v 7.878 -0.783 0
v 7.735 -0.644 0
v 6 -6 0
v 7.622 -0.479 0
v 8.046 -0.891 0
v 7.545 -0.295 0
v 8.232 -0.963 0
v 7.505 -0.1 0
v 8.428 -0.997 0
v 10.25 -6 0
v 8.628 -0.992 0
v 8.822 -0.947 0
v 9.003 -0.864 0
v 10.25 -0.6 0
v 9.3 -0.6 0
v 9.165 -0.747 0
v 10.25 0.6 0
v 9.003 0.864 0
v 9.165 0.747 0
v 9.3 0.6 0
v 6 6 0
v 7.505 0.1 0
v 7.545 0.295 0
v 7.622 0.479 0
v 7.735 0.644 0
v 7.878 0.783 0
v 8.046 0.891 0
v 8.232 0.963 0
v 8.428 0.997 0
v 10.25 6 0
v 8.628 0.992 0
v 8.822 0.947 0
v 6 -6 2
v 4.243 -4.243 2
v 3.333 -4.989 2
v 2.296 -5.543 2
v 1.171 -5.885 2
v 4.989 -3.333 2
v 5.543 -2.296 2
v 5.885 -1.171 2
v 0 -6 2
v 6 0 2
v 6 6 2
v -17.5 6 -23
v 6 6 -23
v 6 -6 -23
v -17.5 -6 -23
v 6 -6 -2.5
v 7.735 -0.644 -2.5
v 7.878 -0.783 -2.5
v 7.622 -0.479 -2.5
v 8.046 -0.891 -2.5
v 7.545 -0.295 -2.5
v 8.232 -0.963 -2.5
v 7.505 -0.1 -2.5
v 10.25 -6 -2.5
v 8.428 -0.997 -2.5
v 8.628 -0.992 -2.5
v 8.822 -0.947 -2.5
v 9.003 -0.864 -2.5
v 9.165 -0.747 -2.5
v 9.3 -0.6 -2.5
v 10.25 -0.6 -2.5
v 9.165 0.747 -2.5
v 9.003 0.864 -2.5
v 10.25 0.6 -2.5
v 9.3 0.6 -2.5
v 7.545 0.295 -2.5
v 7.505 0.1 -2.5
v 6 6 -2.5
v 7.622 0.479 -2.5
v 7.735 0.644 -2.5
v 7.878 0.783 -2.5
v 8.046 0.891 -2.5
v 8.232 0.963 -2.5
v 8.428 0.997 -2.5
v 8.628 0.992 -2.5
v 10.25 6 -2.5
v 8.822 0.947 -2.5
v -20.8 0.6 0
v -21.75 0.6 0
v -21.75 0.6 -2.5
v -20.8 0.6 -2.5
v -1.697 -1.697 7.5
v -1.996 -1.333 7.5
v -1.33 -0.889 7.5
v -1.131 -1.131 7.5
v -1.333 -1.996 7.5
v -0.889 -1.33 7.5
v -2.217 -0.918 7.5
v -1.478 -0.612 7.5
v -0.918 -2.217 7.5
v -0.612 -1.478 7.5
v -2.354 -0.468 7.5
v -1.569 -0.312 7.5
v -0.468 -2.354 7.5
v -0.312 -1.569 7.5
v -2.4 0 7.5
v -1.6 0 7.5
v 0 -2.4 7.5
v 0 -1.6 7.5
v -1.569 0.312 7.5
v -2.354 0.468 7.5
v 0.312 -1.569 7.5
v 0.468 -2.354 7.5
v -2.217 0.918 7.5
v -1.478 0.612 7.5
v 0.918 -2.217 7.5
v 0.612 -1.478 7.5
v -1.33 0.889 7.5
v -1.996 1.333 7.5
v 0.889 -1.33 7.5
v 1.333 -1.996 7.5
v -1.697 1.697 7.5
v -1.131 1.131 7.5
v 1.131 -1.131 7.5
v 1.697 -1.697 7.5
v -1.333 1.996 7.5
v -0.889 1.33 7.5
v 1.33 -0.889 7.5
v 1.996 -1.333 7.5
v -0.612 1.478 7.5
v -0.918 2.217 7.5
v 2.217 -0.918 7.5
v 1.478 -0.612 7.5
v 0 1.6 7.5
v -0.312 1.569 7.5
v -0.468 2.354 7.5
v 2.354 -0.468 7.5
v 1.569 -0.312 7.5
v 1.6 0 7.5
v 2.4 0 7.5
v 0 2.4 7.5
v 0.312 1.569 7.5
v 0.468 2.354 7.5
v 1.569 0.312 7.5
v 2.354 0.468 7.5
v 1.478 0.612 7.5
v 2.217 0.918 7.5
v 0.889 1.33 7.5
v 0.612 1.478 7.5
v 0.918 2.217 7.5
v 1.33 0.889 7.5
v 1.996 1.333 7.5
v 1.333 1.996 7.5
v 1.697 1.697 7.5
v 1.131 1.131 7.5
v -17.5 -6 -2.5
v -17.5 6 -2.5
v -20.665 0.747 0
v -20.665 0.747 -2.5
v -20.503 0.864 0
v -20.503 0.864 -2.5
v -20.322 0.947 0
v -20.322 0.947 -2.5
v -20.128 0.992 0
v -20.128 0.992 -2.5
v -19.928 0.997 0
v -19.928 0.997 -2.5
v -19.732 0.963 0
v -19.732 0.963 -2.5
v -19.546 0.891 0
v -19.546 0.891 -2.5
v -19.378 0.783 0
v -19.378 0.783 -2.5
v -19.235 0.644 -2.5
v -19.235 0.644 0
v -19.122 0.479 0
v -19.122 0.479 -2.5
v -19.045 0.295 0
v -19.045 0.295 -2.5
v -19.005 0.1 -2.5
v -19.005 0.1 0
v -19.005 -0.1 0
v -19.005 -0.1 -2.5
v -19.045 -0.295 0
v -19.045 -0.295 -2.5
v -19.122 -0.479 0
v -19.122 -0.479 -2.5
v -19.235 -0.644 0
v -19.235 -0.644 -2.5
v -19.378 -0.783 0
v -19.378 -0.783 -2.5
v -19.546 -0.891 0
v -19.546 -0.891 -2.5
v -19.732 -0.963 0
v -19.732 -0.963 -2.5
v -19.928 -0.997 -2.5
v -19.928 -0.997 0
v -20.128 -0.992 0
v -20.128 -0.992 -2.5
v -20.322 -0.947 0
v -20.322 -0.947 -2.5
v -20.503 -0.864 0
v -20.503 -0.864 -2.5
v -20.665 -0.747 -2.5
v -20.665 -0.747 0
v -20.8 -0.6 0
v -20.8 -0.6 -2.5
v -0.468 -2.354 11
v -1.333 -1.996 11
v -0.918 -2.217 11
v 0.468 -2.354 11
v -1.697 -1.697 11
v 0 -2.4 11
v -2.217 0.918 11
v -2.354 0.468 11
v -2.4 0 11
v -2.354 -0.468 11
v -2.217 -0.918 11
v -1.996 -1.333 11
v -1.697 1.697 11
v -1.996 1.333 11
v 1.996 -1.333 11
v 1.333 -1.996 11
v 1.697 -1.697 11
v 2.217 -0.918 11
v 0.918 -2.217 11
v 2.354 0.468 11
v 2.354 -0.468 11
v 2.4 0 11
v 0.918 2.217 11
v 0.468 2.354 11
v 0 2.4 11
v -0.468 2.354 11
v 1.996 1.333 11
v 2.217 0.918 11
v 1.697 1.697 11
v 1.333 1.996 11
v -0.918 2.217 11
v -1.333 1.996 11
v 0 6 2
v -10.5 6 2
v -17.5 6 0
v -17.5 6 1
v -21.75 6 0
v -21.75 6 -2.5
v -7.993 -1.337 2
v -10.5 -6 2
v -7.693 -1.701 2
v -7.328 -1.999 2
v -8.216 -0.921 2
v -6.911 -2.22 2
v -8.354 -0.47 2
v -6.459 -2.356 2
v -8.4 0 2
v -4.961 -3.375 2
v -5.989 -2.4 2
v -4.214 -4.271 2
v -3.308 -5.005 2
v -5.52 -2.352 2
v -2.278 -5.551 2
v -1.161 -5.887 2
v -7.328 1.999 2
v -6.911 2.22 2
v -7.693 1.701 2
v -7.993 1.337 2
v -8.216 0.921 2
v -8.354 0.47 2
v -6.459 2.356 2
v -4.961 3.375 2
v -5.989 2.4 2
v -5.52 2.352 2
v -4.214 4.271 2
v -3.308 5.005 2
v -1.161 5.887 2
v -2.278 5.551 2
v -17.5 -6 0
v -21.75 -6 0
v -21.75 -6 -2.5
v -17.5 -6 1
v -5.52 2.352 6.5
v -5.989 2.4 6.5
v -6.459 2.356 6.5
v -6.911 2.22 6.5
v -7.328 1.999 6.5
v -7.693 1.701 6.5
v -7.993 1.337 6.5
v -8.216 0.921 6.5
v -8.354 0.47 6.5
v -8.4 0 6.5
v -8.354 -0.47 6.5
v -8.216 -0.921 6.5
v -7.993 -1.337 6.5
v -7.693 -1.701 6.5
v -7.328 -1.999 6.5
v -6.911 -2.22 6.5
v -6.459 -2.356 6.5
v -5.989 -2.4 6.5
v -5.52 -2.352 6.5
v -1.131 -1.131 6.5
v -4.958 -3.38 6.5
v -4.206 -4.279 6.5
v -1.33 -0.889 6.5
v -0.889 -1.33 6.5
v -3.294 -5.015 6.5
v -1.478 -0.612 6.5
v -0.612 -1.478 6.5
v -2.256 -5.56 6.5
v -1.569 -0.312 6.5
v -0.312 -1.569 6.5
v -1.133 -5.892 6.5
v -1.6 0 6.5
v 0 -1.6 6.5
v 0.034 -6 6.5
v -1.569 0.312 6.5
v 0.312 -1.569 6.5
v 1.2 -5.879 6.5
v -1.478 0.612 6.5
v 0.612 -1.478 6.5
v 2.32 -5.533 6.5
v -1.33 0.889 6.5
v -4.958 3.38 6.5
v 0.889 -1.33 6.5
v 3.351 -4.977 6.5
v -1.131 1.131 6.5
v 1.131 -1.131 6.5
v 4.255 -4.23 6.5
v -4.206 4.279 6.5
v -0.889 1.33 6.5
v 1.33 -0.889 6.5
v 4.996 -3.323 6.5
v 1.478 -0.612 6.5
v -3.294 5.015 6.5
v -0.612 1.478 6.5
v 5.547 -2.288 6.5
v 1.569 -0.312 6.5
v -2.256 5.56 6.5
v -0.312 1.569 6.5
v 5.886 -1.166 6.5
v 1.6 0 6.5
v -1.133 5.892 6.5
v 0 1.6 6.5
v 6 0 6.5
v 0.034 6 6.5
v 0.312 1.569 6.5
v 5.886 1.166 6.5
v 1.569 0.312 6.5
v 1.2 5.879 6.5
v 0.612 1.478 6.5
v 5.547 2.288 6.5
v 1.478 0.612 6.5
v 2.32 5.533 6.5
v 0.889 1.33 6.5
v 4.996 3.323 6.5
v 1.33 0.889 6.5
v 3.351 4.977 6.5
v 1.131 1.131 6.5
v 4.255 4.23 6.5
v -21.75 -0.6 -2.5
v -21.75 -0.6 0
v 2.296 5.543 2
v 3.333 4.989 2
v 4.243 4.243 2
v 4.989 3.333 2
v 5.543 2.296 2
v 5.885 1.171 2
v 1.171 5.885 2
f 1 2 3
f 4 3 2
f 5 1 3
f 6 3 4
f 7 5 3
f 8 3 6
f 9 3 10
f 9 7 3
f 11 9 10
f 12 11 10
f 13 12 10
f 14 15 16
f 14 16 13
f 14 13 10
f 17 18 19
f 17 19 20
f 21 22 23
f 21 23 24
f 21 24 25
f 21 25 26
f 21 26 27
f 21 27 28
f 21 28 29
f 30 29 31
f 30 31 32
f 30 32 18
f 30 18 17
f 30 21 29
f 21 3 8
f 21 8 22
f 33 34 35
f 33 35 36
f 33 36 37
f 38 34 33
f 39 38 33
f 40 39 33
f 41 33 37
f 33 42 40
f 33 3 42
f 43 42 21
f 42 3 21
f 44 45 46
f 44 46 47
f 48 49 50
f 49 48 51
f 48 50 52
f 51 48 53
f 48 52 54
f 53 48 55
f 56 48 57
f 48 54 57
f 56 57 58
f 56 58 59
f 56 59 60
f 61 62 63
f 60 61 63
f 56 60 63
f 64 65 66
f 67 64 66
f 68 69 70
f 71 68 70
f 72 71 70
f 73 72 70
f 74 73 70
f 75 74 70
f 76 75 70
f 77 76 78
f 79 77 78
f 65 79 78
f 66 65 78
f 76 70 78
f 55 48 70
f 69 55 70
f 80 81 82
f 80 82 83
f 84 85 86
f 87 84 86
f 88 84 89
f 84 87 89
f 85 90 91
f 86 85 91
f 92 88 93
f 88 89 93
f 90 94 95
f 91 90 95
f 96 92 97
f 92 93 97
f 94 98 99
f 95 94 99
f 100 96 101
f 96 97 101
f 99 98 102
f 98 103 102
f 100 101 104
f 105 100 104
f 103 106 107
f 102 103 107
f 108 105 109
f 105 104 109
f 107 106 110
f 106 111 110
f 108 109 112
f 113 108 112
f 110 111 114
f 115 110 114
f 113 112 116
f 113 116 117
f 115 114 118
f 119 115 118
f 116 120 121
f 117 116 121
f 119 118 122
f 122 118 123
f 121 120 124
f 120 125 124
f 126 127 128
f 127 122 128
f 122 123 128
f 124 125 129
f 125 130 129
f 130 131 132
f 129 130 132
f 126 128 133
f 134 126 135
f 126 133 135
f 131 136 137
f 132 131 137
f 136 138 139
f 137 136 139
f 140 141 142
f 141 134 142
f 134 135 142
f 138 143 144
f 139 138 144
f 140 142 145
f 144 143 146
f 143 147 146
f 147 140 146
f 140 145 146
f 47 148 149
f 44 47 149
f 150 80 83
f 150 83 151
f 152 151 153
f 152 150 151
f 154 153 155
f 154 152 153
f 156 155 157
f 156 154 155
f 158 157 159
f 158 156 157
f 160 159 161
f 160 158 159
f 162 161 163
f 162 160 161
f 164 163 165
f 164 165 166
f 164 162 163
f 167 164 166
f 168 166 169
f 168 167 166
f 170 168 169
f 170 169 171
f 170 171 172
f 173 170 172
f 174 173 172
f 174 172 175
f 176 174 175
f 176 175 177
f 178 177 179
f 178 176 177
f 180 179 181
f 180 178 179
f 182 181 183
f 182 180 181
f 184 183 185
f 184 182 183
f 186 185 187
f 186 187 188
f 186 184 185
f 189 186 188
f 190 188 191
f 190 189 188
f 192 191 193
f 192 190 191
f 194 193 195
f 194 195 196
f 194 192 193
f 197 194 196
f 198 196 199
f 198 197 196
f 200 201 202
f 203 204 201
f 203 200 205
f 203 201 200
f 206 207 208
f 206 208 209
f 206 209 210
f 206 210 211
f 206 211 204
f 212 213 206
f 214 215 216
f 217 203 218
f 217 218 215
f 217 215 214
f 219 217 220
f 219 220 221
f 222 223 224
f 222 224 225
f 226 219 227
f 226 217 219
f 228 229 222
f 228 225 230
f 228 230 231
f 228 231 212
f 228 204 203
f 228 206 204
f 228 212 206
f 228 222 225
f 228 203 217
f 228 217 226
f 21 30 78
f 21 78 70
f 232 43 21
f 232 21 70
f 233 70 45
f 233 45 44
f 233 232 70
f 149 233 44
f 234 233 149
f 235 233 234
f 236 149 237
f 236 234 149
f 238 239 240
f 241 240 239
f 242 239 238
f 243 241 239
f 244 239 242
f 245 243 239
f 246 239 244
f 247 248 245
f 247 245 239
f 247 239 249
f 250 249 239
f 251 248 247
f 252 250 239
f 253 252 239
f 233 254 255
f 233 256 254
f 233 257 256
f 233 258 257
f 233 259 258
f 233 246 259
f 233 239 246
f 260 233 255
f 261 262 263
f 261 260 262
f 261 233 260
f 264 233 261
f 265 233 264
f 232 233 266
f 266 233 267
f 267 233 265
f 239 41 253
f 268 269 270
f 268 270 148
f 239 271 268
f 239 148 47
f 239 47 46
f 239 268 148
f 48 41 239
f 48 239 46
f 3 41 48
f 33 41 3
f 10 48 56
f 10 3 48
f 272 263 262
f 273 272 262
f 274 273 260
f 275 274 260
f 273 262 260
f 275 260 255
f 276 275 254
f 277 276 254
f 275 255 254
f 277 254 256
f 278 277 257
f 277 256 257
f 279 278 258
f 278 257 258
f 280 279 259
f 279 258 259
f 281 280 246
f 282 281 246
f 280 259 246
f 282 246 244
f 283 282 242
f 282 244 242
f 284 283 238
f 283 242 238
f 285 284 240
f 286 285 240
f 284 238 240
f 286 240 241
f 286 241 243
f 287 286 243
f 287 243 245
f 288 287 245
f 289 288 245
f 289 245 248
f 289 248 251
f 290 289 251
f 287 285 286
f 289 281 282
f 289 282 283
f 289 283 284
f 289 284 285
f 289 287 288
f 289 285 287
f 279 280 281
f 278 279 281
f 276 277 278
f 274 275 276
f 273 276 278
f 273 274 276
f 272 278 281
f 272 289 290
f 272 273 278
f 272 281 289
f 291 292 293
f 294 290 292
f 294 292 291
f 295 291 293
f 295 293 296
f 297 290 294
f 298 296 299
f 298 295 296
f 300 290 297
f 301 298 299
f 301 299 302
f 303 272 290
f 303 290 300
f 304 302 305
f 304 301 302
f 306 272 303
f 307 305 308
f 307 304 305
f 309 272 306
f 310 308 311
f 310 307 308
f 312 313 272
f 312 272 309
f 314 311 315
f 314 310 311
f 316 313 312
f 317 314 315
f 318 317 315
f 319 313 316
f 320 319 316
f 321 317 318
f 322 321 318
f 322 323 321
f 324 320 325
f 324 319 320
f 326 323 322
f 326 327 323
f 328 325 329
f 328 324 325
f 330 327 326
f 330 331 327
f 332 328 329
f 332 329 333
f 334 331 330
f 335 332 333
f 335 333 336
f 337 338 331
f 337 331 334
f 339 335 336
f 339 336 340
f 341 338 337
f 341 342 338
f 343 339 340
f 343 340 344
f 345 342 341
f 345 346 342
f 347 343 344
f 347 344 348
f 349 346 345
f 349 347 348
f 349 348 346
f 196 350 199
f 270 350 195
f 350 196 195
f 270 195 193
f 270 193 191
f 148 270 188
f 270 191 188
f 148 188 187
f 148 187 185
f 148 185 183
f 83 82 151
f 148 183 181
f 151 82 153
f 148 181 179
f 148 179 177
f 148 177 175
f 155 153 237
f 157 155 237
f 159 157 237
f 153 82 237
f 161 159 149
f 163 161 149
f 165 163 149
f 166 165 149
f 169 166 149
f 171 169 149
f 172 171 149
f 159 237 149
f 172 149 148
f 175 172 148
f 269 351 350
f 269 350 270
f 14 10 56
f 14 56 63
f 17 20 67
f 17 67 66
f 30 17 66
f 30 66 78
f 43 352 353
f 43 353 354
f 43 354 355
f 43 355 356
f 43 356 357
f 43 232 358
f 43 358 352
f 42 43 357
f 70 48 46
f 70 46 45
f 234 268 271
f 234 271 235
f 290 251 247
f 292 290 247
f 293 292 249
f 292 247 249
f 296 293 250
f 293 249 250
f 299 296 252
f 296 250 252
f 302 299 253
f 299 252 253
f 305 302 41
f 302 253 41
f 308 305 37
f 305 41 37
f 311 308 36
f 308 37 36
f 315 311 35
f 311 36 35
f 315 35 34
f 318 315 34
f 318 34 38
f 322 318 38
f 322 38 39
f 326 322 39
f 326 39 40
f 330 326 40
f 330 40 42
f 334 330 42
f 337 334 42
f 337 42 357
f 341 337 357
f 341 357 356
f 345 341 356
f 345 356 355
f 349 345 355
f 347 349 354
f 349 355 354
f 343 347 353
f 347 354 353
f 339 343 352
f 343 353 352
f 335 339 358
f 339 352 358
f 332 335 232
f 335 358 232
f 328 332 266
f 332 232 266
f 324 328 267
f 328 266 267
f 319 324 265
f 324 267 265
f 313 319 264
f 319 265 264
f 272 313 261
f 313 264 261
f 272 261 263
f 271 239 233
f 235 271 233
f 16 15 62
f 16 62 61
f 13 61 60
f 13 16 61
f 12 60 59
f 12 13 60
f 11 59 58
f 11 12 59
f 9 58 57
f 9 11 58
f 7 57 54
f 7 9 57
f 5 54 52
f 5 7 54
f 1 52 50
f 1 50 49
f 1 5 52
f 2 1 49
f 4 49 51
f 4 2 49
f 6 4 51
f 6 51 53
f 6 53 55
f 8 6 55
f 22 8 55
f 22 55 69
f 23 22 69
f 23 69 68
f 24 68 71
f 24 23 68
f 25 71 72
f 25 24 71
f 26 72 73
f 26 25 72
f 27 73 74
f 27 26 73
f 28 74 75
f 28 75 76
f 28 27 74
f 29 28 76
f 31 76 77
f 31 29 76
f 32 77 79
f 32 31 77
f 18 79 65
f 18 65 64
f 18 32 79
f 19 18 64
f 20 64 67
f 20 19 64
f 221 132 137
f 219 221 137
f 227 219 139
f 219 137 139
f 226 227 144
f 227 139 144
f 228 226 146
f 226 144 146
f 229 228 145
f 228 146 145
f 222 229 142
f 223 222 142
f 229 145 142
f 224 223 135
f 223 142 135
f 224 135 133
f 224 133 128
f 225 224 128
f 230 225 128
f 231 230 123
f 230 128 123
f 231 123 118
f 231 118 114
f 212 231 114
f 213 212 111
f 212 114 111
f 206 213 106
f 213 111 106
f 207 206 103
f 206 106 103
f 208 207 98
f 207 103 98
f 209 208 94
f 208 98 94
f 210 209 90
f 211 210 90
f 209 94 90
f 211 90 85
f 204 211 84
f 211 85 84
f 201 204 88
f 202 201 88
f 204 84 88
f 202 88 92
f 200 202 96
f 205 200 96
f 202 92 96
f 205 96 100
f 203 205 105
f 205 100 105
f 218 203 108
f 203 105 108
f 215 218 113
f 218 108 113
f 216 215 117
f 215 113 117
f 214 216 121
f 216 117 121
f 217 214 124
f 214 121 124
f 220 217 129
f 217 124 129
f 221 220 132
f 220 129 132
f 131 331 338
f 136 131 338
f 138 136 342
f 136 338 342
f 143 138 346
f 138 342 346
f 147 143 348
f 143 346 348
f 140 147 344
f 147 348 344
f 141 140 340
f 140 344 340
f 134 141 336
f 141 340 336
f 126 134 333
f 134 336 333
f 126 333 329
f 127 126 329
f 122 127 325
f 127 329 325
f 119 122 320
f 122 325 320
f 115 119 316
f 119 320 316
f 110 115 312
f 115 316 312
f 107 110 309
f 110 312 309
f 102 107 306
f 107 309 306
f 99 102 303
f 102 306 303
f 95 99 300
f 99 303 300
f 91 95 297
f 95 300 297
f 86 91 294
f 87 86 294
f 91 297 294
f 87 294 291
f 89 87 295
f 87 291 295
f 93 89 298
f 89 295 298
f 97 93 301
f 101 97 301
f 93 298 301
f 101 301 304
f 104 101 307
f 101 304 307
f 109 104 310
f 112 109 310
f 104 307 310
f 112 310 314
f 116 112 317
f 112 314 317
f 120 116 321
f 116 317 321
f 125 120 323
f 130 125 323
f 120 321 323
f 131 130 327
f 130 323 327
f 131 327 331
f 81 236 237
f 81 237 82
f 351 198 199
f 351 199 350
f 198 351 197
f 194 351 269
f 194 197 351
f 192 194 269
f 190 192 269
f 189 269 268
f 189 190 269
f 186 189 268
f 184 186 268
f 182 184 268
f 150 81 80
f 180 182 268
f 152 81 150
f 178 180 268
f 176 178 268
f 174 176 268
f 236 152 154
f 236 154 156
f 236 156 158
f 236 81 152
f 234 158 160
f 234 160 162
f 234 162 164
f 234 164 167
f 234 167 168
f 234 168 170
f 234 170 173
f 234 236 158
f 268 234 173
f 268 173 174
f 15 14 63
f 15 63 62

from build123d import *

# Parameters (mm, degrees)
SKETCH1_R           = 6
BOSS_EXTRUDE1_DEPTH = 6.5
SKETCH2_W           = 23.5
SKETCH2_H           = 12
BOSS_EXTRUDE2_DEPTH = 2
BOSS_EXTRUDE3_DEPTH = 2.5
SKETCH4_W           = 23.5
SKETCH4_H           = 12
BOSS_EXTRUDE4_DEPTH = 20.5
BOSS_EXTRUDE5_DEPTH = 4.5
SKETCH6_R           = 1.6
BOSS_EXTRUDE6_DEPTH = 1
SKETCH7_R           = 2.4
BOSS_EXTRUDE7_DEPTH = 3.5
CHAMFER1_SIZE       = 1
CHAMFER1_SIZE2      = 7


with BuildPart() as part:
    # Sketch1 → Boss-Extrude1 (new body)
    with BuildSketch(Plane.XY):
        with Locations(Location((0, 0, 0), (0, 0, 180))):
            Circle(SKETCH1_R)
    extrude(amount=BOSS_EXTRUDE1_DEPTH)

    # Sketch2 → Boss-Extrude2 (add)
    with BuildSketch(Plane.XY):
        with Locations((-5.75, 0)):
            Rectangle(SKETCH2_W, SKETCH2_H)
    extrude(amount=BOSS_EXTRUDE2_DEPTH)

    # Sketch3 → Boss-Extrude3 (add)
    with BuildSketch(Plane.XY):
        with BuildLine():
            Line((10.25, 6), (-21.75, 6))
            Line((-21.75, 6), (-21.75, 0.6))
            Line((-21.75, 0.6), (-20.8, 0.6))
            ThreePointArc((-20.8, 0.6), (-19, 0), (-20.8, -0.6))
            Line((-20.8, -0.6), (-21.75, -0.6))
            Line((-21.75, -0.6), (-21.75, -6))
            Line((-21.75, -6), (10.25, -6))
            Line((10.25, -6), (10.25, -0.6))
            Line((10.25, -0.6), (9.3, -0.6))
            ThreePointArc((9.3, -0.6), (7.5, 0), (9.3, 0.6))
            Line((9.3, 0.6), (10.25, 0.6))
            Line((10.25, 0.6), (10.25, 6))
        make_face()
    extrude(amount=-BOSS_EXTRUDE3_DEPTH)

    # Sketch4 → Boss-Extrude4 (add)
    with BuildSketch(Plane(origin=(0, 0, -2.5), x_dir=(-1, 0, 0), z_dir=(0, 0, -1))):
        with Locations((5.75, 0)):
            Rectangle(SKETCH4_W, SKETCH4_H)
    extrude(amount=BOSS_EXTRUDE4_DEPTH)

    # Sketch5 → Boss-Extrude5 (add)
    with BuildSketch(Plane.XY.offset(2)):
        with BuildLine():
            ThreePointArc((-5.52, -2.351510153), (-6, 0), (-5.52, 2.351510153))
            ThreePointArc((-5.52, 2.351510153), (-8.4, 0), (-5.52, -2.351510153))
        make_face()
    extrude(amount=BOSS_EXTRUDE5_DEPTH)

    # Sketch6 → Boss-Extrude6 (add)
    with BuildSketch(Plane.XY.offset(6.5)):
        Circle(SKETCH6_R)
    extrude(amount=BOSS_EXTRUDE6_DEPTH)

    # Sketch7 → Boss-Extrude7 (add)
    with BuildSketch(Plane.XY.offset(7.5)):
        Circle(SKETCH7_R)
    extrude(amount=BOSS_EXTRUDE7_DEPTH)

    # Chamfer1
    chamfer1_edges = [part.edges().sort_by_distance(p)[0] for p in [
        (-17.5, 0, 2),
    ]]
    chamfer1_side = [part.faces().sort_by_distance(p)[0] for p in [
        (-17.5, 0, 1),
    ]]
    chamfer(chamfer1_edges, length=CHAMFER1_SIZE, length2=CHAMFER1_SIZE2, reference=chamfer1_side[0])


solid = part.part
